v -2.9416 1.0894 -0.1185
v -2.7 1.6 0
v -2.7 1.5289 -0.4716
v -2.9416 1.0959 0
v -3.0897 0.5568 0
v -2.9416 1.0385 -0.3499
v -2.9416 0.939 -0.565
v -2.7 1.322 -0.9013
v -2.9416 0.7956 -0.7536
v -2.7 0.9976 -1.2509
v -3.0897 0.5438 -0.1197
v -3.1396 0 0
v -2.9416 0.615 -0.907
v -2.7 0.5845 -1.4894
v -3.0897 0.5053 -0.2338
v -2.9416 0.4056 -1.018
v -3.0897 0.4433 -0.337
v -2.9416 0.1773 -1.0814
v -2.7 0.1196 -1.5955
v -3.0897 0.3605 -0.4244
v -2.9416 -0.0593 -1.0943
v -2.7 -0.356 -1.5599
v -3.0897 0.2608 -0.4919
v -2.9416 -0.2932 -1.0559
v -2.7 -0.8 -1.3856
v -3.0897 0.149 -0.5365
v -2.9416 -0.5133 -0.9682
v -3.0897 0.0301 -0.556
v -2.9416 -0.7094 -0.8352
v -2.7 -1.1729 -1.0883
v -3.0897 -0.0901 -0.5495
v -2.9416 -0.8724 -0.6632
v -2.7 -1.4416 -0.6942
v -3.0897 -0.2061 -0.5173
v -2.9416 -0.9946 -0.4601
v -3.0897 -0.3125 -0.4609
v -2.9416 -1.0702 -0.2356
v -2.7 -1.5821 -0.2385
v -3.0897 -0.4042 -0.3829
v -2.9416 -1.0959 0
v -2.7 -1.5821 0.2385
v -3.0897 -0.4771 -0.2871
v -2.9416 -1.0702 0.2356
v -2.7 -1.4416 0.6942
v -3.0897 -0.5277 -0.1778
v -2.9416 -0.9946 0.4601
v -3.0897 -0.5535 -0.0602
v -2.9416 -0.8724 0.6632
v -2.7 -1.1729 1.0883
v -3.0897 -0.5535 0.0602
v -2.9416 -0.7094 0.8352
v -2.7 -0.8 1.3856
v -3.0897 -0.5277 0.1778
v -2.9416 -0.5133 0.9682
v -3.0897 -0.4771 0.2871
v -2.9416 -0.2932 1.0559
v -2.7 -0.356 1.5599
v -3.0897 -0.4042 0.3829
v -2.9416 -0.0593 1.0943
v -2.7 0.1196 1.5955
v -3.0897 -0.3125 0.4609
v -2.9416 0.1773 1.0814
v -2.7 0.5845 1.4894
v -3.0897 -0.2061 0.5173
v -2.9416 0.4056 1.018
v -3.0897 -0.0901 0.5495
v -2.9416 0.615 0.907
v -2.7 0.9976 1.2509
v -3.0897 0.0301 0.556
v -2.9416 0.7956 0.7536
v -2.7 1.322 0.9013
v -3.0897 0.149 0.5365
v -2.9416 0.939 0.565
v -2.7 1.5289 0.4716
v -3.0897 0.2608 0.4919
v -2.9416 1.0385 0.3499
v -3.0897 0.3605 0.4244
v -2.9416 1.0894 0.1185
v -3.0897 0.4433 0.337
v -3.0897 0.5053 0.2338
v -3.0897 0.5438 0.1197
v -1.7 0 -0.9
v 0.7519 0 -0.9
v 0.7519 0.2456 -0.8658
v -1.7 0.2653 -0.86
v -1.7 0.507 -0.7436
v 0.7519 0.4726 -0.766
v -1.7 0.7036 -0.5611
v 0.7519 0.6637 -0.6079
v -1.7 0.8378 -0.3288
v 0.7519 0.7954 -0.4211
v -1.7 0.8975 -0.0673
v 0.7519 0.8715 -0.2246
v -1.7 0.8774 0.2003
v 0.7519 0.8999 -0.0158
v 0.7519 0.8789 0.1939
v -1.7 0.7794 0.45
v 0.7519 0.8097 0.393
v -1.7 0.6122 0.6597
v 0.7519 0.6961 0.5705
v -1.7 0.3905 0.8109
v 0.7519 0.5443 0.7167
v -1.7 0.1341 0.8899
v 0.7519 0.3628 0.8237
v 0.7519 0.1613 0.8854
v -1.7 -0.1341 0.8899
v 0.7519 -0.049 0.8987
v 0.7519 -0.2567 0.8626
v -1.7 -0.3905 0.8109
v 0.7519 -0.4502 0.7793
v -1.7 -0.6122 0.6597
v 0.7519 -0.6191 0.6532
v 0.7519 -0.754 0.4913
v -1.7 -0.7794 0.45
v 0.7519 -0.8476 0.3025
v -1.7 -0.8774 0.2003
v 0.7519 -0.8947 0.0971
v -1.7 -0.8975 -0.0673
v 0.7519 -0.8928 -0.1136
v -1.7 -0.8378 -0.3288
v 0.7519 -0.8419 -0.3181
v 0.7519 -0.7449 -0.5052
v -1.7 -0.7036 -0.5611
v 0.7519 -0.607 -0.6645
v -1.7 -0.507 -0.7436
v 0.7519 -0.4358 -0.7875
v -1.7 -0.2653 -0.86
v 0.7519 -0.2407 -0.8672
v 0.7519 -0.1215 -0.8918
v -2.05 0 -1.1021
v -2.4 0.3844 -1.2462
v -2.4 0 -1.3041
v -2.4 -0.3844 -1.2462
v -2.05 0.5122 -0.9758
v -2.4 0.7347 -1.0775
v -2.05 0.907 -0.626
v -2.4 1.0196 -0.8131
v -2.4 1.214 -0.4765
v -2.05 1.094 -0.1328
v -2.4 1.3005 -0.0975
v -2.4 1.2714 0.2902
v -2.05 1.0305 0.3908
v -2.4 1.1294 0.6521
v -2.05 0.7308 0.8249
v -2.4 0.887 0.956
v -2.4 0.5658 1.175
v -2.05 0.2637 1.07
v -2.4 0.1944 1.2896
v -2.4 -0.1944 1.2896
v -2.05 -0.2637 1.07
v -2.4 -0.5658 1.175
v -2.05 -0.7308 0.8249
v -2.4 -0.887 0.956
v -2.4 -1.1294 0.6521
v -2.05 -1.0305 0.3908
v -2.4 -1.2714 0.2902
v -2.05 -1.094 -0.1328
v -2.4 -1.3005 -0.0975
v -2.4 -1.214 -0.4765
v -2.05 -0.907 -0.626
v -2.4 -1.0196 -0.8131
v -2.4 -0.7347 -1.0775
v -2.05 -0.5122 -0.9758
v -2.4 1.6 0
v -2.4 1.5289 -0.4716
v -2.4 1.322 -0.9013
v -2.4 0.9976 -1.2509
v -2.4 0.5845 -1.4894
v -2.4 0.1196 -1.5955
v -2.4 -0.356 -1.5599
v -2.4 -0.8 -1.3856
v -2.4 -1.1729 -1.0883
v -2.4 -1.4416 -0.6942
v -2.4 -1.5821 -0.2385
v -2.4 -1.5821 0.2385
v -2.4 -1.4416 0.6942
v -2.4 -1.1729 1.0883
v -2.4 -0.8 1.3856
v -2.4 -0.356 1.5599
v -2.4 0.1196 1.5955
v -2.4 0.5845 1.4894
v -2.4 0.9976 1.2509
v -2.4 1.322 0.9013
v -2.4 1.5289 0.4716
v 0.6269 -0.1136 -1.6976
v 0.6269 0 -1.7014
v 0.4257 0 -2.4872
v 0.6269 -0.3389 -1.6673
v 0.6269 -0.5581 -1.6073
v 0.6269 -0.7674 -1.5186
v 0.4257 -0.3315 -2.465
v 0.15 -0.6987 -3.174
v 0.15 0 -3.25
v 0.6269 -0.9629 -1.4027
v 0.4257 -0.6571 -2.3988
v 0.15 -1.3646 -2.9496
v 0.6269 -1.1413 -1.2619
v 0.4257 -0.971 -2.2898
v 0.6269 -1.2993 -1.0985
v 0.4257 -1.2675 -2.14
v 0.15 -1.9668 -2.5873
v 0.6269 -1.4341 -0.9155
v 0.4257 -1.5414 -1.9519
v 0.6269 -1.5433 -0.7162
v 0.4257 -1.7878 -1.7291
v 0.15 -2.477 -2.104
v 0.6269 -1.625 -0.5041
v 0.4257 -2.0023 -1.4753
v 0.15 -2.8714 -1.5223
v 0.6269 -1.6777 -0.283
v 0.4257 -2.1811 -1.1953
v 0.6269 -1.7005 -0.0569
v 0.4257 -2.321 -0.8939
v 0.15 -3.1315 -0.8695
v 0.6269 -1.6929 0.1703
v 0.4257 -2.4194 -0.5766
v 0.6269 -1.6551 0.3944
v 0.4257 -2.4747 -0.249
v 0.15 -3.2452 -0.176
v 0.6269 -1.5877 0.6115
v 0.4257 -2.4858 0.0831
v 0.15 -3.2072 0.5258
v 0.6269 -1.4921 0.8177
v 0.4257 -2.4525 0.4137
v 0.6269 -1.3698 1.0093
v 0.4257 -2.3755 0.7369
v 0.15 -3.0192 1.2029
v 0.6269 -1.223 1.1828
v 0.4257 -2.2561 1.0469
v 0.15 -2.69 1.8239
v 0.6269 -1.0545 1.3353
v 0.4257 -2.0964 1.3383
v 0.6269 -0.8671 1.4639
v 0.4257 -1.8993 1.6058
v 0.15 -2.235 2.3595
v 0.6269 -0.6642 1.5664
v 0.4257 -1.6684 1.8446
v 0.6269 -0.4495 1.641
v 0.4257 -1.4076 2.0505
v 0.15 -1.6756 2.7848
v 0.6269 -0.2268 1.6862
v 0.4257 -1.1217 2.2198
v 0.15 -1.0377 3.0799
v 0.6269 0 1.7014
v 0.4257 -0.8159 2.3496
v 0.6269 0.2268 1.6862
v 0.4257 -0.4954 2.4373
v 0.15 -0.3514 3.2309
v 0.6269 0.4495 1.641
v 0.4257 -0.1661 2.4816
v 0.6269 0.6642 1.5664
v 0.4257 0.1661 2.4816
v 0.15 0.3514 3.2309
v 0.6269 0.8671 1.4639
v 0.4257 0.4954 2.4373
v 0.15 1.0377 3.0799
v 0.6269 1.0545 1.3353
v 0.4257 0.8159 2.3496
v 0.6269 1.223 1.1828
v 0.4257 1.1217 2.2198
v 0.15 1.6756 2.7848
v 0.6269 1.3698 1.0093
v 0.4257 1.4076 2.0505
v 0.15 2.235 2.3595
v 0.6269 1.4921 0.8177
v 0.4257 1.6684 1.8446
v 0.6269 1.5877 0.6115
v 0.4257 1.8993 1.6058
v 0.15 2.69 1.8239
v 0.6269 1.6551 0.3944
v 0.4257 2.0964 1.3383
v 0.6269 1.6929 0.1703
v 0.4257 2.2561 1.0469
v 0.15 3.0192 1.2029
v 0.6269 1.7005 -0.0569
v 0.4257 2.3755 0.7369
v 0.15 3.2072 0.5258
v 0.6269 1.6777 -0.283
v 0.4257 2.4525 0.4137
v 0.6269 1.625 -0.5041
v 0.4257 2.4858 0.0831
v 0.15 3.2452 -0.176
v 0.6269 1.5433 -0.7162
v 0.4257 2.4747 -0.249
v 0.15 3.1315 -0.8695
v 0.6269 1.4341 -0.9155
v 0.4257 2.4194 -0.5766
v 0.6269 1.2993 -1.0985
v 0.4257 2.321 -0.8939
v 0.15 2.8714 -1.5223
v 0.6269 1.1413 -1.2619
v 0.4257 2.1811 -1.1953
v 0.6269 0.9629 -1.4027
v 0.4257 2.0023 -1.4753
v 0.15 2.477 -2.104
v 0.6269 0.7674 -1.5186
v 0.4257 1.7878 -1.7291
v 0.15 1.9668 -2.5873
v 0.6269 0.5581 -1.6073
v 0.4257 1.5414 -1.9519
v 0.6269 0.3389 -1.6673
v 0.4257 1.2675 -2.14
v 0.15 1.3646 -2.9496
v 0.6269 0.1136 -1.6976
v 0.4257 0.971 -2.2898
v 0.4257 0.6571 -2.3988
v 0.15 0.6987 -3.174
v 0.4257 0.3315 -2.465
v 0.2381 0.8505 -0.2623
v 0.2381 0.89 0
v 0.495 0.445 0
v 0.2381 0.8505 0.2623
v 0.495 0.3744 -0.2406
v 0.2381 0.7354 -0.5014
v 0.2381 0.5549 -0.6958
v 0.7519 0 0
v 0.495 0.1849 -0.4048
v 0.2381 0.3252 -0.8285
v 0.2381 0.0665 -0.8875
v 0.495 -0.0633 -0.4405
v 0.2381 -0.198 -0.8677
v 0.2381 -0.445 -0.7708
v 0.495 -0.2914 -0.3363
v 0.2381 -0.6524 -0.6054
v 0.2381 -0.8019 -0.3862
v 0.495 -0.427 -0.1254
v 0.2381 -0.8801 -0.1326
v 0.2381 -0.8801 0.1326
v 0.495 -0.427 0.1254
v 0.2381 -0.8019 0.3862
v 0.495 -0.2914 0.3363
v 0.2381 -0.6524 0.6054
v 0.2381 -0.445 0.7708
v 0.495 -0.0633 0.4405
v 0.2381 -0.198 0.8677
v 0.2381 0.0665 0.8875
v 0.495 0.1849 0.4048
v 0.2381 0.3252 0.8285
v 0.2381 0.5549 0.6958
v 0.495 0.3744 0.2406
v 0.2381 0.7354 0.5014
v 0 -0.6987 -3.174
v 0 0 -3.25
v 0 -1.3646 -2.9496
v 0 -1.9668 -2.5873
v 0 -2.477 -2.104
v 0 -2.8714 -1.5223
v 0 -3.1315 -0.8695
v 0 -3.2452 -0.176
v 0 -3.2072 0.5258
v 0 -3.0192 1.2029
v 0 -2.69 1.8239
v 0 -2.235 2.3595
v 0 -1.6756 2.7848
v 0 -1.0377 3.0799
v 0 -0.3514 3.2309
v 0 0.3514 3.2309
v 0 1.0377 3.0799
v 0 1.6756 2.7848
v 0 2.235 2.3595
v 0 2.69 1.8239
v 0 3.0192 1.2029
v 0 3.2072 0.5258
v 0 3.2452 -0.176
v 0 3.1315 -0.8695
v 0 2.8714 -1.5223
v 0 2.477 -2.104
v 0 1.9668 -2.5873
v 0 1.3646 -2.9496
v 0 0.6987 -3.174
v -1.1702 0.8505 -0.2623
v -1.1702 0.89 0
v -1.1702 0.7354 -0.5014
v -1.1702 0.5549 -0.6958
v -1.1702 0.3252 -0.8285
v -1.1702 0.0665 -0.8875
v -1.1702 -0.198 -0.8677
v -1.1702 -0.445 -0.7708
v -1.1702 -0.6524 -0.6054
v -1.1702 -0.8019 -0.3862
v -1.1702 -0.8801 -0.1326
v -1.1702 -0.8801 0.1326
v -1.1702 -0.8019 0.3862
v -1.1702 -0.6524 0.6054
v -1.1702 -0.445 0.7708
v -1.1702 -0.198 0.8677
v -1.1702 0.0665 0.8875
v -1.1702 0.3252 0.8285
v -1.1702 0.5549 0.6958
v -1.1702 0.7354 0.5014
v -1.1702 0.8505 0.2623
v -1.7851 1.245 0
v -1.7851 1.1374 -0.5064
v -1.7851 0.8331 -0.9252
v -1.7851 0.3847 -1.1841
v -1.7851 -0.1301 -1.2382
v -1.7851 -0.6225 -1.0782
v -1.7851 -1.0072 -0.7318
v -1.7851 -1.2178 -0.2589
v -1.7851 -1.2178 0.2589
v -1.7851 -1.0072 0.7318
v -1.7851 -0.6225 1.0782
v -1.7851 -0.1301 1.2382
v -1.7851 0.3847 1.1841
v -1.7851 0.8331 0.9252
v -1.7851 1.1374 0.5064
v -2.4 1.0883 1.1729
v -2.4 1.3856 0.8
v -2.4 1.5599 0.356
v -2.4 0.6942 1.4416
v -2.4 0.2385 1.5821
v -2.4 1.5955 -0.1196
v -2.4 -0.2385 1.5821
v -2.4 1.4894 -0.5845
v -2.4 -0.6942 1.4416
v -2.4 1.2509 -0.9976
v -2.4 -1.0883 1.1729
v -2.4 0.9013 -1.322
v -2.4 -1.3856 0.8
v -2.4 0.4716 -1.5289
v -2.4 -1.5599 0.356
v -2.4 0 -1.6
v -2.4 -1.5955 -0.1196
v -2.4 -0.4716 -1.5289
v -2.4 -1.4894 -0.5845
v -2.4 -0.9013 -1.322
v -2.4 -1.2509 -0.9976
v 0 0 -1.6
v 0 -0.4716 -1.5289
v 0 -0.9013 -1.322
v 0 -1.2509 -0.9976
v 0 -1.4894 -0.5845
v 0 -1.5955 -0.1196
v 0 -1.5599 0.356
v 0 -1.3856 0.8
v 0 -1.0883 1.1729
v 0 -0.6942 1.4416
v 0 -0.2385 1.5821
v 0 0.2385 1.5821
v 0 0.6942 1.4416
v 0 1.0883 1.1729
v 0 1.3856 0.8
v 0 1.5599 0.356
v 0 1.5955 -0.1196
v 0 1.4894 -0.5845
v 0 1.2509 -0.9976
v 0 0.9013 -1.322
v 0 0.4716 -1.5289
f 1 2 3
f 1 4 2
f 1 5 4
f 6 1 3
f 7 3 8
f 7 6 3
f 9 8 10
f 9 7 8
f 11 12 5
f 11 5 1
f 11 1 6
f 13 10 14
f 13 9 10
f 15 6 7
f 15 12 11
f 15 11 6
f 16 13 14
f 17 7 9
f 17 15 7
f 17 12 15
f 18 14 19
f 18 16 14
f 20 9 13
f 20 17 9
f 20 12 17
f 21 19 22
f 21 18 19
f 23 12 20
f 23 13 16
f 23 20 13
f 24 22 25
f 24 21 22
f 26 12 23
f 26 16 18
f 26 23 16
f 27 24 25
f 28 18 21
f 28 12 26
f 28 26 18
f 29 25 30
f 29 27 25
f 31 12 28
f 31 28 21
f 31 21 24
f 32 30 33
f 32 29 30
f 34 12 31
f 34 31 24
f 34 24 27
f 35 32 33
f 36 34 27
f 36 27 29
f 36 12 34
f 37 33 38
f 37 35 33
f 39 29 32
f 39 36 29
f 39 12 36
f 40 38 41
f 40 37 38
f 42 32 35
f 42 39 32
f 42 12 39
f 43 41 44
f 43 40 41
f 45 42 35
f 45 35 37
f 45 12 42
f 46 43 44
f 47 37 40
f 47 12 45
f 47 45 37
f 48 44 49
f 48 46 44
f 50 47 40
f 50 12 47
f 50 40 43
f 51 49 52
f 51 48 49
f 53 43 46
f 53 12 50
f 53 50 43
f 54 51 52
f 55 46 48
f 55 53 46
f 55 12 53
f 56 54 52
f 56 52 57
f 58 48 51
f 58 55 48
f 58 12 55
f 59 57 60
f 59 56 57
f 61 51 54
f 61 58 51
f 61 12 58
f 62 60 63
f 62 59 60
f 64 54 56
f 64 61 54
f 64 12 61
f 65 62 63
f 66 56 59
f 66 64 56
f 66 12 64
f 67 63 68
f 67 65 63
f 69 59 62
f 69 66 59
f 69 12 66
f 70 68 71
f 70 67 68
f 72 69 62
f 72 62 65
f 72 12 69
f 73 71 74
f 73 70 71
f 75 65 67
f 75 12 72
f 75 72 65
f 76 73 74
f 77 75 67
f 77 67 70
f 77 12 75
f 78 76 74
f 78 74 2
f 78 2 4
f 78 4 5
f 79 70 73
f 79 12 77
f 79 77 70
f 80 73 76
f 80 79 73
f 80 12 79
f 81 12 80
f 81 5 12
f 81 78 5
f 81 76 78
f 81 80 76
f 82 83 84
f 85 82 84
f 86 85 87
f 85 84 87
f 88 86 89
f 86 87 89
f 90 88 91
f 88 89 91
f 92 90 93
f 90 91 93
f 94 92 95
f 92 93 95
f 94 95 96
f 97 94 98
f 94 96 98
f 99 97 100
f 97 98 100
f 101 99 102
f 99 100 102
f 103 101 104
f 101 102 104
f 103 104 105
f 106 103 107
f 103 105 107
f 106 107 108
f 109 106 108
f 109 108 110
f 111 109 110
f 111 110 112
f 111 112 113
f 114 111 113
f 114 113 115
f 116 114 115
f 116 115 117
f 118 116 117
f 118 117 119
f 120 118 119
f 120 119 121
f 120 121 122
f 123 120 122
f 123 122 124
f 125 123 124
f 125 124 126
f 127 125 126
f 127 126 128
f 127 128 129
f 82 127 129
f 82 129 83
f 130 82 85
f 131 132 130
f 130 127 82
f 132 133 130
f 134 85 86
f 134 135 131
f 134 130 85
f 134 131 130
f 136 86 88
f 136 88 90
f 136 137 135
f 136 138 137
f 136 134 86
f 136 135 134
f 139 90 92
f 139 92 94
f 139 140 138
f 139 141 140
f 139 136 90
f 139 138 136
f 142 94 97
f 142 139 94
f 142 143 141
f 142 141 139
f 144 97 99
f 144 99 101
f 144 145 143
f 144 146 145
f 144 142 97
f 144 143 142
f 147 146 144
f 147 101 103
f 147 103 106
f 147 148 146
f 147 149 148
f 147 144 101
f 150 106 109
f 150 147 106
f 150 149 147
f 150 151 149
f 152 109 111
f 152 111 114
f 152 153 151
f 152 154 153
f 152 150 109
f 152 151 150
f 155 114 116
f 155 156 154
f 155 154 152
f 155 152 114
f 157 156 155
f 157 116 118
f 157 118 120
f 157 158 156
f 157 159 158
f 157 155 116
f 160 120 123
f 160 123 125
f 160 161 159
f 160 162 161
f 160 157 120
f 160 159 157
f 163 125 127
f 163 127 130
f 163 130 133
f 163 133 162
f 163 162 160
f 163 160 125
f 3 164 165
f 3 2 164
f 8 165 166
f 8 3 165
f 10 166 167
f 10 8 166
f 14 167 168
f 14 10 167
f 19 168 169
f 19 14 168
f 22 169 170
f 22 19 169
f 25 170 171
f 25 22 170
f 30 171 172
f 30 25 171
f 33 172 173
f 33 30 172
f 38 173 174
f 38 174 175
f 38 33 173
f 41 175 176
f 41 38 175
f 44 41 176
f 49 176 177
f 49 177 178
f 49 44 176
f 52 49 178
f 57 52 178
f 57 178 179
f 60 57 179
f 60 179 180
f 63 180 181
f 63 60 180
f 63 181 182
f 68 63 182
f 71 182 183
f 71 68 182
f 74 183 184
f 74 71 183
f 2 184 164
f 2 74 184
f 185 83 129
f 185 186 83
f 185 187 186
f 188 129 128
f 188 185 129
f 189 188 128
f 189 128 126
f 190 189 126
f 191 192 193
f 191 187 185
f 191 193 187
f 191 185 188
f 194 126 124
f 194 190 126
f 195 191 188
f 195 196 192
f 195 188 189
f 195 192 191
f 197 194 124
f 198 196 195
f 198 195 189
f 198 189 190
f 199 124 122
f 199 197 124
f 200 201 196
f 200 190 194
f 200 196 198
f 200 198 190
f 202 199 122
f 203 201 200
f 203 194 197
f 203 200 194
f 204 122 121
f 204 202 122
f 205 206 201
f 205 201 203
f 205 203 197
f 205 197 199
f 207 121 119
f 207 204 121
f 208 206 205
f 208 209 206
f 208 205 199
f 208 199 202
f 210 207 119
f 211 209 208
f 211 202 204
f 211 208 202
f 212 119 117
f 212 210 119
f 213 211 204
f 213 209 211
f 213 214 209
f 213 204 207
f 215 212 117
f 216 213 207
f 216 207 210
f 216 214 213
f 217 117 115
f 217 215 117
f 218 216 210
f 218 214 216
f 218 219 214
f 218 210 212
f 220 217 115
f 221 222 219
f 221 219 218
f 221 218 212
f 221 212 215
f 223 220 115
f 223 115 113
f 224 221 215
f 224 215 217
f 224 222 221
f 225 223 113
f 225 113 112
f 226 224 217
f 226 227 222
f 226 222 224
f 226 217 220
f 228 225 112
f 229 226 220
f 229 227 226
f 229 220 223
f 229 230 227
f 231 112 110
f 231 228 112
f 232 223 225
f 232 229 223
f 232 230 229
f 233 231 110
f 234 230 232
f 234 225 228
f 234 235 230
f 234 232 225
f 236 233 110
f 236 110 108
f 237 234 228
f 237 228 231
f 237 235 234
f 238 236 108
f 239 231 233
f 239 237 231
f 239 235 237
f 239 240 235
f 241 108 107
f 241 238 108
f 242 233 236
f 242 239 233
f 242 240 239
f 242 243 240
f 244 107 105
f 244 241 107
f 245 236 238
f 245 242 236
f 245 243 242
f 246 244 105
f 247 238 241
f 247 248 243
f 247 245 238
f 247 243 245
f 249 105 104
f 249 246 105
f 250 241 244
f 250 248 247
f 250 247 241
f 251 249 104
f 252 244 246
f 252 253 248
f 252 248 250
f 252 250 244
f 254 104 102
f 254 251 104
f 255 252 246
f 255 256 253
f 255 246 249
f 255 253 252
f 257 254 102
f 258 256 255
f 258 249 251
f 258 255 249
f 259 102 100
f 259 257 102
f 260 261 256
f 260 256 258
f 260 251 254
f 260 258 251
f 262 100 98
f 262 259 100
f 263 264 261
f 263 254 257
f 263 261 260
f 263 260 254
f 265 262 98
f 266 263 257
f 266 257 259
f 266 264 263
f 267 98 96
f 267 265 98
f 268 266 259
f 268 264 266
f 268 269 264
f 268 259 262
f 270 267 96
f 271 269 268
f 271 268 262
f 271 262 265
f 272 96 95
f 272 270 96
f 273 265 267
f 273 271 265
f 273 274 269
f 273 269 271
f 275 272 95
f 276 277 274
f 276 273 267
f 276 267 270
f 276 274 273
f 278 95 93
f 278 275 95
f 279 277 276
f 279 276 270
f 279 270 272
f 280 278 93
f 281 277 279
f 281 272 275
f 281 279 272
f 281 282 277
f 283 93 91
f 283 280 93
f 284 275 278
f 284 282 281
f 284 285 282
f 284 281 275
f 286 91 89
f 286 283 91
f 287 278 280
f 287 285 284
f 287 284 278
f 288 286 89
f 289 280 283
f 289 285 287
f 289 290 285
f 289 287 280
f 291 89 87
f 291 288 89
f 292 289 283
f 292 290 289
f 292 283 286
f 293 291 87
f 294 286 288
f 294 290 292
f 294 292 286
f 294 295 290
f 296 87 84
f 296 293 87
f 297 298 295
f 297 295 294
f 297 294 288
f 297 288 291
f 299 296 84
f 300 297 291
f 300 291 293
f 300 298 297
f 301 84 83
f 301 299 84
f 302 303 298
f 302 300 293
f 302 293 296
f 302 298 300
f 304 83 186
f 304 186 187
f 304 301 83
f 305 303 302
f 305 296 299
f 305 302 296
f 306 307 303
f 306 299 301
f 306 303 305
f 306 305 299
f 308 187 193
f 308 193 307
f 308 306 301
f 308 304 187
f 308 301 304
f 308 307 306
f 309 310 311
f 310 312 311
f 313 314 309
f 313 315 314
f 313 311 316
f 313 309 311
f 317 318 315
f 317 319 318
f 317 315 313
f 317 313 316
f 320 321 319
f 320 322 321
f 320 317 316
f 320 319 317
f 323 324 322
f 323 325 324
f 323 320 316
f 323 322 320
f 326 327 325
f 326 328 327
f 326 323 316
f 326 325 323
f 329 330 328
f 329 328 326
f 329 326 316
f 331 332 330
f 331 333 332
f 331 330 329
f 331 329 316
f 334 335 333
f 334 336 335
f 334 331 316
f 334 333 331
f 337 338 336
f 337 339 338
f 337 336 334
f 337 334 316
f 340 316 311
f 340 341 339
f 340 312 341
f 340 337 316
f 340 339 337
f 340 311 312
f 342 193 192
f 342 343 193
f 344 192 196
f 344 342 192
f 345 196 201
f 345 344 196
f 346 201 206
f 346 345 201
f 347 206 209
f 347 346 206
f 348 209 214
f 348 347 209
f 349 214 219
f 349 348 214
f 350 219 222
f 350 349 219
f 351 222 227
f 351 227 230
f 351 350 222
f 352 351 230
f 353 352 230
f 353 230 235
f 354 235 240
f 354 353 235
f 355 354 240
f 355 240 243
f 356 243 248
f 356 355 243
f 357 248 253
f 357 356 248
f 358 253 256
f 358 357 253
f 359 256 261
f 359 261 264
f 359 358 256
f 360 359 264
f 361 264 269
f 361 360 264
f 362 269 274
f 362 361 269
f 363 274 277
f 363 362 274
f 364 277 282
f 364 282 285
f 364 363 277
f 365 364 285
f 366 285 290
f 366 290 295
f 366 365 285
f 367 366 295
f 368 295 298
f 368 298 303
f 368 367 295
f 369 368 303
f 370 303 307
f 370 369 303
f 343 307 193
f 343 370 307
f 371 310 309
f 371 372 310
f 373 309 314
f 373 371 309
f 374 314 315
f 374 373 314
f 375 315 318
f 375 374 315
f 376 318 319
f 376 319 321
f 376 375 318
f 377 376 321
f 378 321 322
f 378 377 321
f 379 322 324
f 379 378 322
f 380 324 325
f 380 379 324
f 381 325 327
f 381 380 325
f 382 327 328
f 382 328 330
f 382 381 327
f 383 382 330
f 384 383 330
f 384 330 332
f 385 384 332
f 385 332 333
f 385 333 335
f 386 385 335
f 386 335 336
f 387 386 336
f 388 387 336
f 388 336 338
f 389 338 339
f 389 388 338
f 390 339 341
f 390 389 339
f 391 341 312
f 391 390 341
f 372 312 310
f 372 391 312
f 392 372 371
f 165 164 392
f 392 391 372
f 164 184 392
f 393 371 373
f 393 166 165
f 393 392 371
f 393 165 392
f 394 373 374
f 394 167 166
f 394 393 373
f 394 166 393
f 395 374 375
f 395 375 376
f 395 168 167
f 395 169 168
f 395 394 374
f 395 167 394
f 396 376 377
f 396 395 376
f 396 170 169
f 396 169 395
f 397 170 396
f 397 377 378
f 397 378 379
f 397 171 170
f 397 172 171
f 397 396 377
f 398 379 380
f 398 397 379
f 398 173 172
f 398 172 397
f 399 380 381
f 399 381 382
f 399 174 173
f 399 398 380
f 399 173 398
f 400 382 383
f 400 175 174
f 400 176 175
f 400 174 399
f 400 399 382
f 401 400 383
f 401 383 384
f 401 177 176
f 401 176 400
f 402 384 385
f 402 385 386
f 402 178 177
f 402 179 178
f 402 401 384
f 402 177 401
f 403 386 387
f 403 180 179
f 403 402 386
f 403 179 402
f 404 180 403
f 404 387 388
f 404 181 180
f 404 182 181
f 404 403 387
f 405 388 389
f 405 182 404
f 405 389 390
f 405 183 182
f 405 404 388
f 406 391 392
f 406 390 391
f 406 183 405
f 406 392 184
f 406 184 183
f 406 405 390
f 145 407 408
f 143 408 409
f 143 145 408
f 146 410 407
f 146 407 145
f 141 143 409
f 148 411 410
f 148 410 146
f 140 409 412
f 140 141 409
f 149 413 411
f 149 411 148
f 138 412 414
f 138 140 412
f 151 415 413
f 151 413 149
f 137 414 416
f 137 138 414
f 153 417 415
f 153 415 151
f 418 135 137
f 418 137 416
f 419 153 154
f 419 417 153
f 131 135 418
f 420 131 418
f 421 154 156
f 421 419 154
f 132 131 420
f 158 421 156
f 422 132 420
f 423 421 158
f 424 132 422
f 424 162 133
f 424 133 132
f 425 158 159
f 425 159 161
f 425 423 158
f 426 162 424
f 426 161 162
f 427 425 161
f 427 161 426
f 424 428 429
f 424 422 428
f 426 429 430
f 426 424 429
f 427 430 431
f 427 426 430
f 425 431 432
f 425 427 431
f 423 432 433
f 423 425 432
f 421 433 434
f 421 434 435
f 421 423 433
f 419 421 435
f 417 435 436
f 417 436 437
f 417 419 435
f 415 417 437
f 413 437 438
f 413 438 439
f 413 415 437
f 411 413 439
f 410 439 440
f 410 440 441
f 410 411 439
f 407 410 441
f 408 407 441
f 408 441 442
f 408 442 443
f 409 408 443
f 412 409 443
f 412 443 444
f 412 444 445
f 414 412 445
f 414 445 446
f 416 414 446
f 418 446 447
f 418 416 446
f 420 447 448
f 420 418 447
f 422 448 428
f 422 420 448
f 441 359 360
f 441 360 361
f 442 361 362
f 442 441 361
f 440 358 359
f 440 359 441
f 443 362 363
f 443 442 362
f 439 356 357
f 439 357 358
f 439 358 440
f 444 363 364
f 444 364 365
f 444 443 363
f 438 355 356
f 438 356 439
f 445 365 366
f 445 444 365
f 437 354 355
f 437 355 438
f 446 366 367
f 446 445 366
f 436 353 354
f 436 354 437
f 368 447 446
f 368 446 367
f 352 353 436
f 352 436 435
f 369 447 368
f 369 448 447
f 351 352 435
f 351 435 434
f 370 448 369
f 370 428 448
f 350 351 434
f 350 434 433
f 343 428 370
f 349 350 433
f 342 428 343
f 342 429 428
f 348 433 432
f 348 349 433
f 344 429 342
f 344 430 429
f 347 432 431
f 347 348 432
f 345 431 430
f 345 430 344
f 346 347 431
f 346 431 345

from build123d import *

# Parameters (mm, degrees)
F_1_8_1_8_DIAMETER_HOLE1_D = 1.8
CHAMFER1_SIZE              = 0.7
CHAMFER1_SIZE2             = 0.404145188


with BuildPart() as part:
    # Sketch1 → Revolve1 (revolve)
    with BuildSketch(Plane.XY, mode=Mode.PRIVATE) as revolve1_sk:
        with BuildLine():
            Line((0, 3.25), (0, 1.6))
            Line((0, 1.6), (-2.4, 1.6))
            Line((-2.4, 1.6), (-2.4, 0))
            Line((-2.4, 0), (0.8, 0))
            ThreePointArc((0.8, 0), (0.63590671, 1.657181342), (0.15, 3.25))
            Line((0.15, 3.25), (0, 3.25))
        make_face()
    revolve(revolve1_sk.sketch.rotate(Axis((0, 0, 0), (-1, 0, 0)), 90), axis=Axis((0, 0, 0), (-1, 0, 0)))

    # Ø1.8 (1.8) Diameter Hole1 (through all)
    with Locations(Plane.ZY.offset(2.4)):
        with Locations((0, 0)):
            Hole(F_1_8_1_8_DIAMETER_HOLE1_D / 2)

    # Chamfer1
    chamfer1_edges = [part.edges().sort_by_distance(p)[0] for p in [
        (-2.4, 0, 0.9),
    ]]
    chamfer1_side = [part.faces().sort_by_distance(p)[0] for p in [
        (-0.824032849, 0, 0.9),
    ]]
    chamfer(chamfer1_edges, length=CHAMFER1_SIZE, length2=CHAMFER1_SIZE2, reference=chamfer1_side[0])


with BuildPart() as body_2:
    # Sketch5 → Revolve2 (revolve)
    with BuildSketch(Plane.XY):
        with BuildLine():
            Line((0.751934301, 0), (0.238092562, 0.89))
            Line((0.238092562, 0.89), (-1.170243927, 0.89))
            Line((-1.170243927, 0.89), (-2.4, 1.6))
            Line((-2.4, 1.6), (-2.7, 1.6))
            ThreePointArc((-2.7, 1.6), (-3.027668145, 0.829639869), (-3.139555738, 0))
            Line((-3.139555738, 0), (0.751934301, 0))
        make_face()
    revolve(axis=Axis((0, 0, 0), (-1, 0, 0)))


solid = Compound([part.part, body_2.part])
